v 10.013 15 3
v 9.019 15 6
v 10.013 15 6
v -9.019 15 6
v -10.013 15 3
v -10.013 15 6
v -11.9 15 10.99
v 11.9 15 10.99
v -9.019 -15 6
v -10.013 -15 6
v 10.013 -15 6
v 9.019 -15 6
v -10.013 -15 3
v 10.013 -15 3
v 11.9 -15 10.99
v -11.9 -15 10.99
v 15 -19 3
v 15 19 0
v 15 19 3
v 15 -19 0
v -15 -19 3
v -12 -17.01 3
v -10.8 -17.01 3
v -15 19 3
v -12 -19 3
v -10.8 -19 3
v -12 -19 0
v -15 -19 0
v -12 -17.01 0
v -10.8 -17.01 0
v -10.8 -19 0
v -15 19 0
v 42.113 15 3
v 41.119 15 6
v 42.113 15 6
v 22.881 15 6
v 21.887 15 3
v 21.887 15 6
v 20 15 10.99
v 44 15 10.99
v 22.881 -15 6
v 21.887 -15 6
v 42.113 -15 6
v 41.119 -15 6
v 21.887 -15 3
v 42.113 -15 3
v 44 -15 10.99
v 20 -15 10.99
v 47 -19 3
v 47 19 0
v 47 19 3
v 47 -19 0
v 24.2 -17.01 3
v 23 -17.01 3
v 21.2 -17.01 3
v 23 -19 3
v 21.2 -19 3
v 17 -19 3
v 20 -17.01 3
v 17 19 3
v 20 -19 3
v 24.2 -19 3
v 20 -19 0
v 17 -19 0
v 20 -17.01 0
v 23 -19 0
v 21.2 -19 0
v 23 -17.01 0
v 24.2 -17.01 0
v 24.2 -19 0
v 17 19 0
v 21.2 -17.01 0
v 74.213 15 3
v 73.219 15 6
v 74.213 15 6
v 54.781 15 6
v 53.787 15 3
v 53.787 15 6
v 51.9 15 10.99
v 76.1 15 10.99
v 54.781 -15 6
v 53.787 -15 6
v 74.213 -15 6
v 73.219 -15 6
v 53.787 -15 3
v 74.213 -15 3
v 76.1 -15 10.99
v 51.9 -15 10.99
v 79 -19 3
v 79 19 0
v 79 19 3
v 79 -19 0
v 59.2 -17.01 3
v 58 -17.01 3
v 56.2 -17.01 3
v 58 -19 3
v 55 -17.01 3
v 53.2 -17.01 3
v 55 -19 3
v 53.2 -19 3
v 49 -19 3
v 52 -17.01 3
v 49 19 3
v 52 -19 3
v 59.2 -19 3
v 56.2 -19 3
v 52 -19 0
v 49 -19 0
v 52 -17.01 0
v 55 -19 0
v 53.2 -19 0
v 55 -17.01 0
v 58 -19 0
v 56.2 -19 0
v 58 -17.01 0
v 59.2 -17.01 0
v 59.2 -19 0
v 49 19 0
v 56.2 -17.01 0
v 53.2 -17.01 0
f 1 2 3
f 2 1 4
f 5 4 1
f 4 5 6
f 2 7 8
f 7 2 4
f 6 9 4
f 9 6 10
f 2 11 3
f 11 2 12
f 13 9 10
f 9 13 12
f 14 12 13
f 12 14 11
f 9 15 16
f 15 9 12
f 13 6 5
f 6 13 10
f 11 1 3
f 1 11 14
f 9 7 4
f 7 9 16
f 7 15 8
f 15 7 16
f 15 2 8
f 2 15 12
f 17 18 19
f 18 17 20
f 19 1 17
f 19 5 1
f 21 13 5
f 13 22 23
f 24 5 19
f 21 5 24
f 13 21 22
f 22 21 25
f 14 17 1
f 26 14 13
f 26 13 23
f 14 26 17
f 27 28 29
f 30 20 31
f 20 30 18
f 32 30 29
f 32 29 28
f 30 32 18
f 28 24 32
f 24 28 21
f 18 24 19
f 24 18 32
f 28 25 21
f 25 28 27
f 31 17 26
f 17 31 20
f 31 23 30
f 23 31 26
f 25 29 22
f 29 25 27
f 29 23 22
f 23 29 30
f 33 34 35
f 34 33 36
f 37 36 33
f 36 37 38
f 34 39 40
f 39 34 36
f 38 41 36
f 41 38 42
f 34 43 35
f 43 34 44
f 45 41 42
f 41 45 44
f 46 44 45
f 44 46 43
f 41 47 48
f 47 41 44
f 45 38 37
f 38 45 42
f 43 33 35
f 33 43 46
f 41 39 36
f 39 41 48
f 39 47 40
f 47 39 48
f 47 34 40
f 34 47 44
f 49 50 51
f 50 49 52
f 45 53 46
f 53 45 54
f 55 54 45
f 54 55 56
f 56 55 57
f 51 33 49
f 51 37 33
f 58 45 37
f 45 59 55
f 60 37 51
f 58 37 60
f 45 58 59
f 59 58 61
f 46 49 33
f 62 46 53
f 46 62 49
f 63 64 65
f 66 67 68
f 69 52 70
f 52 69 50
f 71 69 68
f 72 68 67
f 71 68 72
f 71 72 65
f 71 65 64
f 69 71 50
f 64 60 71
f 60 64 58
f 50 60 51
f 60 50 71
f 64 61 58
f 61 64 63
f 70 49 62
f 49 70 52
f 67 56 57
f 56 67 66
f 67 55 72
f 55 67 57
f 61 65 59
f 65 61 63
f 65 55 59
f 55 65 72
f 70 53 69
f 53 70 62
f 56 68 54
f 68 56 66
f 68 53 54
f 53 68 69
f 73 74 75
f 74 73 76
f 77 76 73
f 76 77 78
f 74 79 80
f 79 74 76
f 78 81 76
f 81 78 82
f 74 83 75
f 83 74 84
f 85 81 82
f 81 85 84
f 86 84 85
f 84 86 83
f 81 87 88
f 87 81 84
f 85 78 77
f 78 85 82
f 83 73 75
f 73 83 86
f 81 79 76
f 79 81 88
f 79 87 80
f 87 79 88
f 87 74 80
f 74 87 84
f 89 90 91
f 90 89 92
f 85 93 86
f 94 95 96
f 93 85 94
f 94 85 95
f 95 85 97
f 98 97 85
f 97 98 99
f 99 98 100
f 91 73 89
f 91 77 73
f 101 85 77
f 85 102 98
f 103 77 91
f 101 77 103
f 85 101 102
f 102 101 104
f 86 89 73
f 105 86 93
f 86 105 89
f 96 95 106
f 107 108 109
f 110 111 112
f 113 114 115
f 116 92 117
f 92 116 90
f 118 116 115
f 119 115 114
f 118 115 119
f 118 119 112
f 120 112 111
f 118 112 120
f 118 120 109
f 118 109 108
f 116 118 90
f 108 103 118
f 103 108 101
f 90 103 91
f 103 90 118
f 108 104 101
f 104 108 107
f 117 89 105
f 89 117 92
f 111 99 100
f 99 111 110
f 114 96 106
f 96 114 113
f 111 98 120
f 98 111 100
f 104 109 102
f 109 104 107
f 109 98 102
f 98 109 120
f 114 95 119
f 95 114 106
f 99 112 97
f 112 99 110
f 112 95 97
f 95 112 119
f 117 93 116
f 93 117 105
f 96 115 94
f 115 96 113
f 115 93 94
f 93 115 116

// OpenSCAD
// TeamLynx Phase 4: print these BEFORE the real parts, in the same material and settings.
//   dovetail_gauge  three shoes at DT_FIT -0.2 / 0 / +0.2 mm (1, 2, 3 notches). Try each in
//                   your mount; set DT_FIT in lynx_common.scad to the one that clicks in with
//                   light hand force and does not rock. The gib screw then takes up the rest.
//   insert_coupon   M2 / M2.5 / M3 insert holes at -0.1 / 0 / +0.1 mm. Install inserts and
//                   pull-test; adjust INSERT_* hole_d if they spin (too big) or bulge (too small).
//   window_coupon   one camera-window pocket with its four screw inserts at 1:1, to test the
//                   Lexan cut, the gasket compression and the bezel lip.
//   rail_coupon     20 mm Picatinny clamp body + jaw: check the fit on your rail adapter.
// Parts: dovetail_gauge insert_coupon window_coupon window_bezel rail_coupon rail_jaw
include <lynx_common.scad>

part = "dovetail_gauge";

module dovetail_gauge() {
    for (i = [0 : 2]) {
        trim = (i - 1) * 0.2;
        translate([i * (DT_W_TOP + 8), 0, 0]) difference() {
            union() {
                translate([-(DT_W_TOP + 6) / 2, -DT_LEN / 2 - 4, 0]) cube([DT_W_TOP + 6, DT_LEN + 8, 3]);
                translate([0, 0, 2.99]) rotate([0, 0, 90]) {
                    wn = dt_w_neck(DT_W_TOP + trim, DT_H, DT_ANGLE);
                    translate([-DT_LEN / 2, -(wn + 2) / 2, 0]) cube([DT_LEN, wn + 2, DT_RISER + 0.01]);
                    translate([0, 0, DT_RISER]) rotate([90, 0, 90]) translate([0, 0, -DT_LEN / 2])
                        linear_extrude(DT_LEN) dovetail_profile(DT_W_TOP, DT_H, DT_ANGLE, trim);
                }
            }
            for (n = [0 : i]) translate([-(DT_W_TOP + 6) / 2 + 3 + n * 3, -DT_LEN / 2 - 4 - 0.01, -0.01]) cube([1.2, 2, 3.02]);
        }
    }
}

module insert_coupon() {
    sets = [[INSERT_M2, "M2"], [INSERT_M25, "M2.5"], [INSERT_M3, "M3"]];
    difference() {
        cube([3 * 14, 3 * 12 + 6, 8]);
        for (r = [0 : 2], c = [0 : 2]) {
            ins = sets[r][0];
            translate([7 + c * 14, 8 + r * 12, 8.01]) insert_hole([ins[0] + (c - 1) * 0.1, ins[1], ins[2]]);
        }
        for (r = [0 : 2]) translate([1, 6 + r * 12, 8 - 0.5]) cube([0.8, 4, 1]);
    }
}

// one camera-window pocket and four inserts, same numbers as sensor_pod.scad
win = [42, 38];
pocket = 3.7;
module window_coupon() {
    size = win + [14, 14];
    difference() {
        translate([-size[0] / 2, -size[1] / 2, 0]) rbox([size[0], size[1], 8.5], 3);
        translate([0, 0, 8.5 - pocket]) linear_extrude(pocket + 1) rrect(win + [2 * CLR_LOOSE, 2 * CLR_LOOSE], 2.3);
        translate([0, 0, -1]) linear_extrude(12) rrect([34, 30], 1.5);
        for (sx = [-1, 1], sy = [-1, 1]) translate([sx * (size[0] / 2 - 3.6), sy * (size[1] / 2 - 3.6), 8.51]) insert_hole(INSERT_M3);
    }
}
module window_bezel() {
    size = win + [14, 14];
    difference() {
        translate([-size[0] / 2, -size[1] / 2, 0]) rbox([size[0], size[1], 2.5], 3);
        translate([0, 0, -1]) linear_extrude(5) rrect(win - [6, 6], 1.5);
        for (sx = [-1, 1], sy = [-1, 1]) translate([sx * (size[0] / 2 - 3.6), sy * (size[1] / 2 - 3.6), -1]) cylinder(d = CLEAR_M3 + HOLE_COMP, h = 5);
    }
}

module rail_coupon() difference() {
    translate([0, 0, 0]) union() {
        picatinny_clamp_body(20 + 2 * PIC_SLOT_PITCH - 10);
        translate([-15, -PJ_W / 2, 0]) cube([30, PJ_W, 3]);
    }
    picatinny_clamp_cut(20 + 2 * PIC_SLOT_PITCH - 10);
}

if (part == "dovetail_gauge") dovetail_gauge();
else if (part == "insert_coupon") insert_coupon();
else if (part == "window_coupon") window_coupon();
else if (part == "window_bezel") window_bezel();
else if (part == "rail_coupon") rotate([180, 0, 0]) rail_coupon();
else if (part == "rail_jaw") rotate([-90, 0, 0]) picatinny_jaw(20 + 2 * PIC_SLOT_PITCH - 10);
